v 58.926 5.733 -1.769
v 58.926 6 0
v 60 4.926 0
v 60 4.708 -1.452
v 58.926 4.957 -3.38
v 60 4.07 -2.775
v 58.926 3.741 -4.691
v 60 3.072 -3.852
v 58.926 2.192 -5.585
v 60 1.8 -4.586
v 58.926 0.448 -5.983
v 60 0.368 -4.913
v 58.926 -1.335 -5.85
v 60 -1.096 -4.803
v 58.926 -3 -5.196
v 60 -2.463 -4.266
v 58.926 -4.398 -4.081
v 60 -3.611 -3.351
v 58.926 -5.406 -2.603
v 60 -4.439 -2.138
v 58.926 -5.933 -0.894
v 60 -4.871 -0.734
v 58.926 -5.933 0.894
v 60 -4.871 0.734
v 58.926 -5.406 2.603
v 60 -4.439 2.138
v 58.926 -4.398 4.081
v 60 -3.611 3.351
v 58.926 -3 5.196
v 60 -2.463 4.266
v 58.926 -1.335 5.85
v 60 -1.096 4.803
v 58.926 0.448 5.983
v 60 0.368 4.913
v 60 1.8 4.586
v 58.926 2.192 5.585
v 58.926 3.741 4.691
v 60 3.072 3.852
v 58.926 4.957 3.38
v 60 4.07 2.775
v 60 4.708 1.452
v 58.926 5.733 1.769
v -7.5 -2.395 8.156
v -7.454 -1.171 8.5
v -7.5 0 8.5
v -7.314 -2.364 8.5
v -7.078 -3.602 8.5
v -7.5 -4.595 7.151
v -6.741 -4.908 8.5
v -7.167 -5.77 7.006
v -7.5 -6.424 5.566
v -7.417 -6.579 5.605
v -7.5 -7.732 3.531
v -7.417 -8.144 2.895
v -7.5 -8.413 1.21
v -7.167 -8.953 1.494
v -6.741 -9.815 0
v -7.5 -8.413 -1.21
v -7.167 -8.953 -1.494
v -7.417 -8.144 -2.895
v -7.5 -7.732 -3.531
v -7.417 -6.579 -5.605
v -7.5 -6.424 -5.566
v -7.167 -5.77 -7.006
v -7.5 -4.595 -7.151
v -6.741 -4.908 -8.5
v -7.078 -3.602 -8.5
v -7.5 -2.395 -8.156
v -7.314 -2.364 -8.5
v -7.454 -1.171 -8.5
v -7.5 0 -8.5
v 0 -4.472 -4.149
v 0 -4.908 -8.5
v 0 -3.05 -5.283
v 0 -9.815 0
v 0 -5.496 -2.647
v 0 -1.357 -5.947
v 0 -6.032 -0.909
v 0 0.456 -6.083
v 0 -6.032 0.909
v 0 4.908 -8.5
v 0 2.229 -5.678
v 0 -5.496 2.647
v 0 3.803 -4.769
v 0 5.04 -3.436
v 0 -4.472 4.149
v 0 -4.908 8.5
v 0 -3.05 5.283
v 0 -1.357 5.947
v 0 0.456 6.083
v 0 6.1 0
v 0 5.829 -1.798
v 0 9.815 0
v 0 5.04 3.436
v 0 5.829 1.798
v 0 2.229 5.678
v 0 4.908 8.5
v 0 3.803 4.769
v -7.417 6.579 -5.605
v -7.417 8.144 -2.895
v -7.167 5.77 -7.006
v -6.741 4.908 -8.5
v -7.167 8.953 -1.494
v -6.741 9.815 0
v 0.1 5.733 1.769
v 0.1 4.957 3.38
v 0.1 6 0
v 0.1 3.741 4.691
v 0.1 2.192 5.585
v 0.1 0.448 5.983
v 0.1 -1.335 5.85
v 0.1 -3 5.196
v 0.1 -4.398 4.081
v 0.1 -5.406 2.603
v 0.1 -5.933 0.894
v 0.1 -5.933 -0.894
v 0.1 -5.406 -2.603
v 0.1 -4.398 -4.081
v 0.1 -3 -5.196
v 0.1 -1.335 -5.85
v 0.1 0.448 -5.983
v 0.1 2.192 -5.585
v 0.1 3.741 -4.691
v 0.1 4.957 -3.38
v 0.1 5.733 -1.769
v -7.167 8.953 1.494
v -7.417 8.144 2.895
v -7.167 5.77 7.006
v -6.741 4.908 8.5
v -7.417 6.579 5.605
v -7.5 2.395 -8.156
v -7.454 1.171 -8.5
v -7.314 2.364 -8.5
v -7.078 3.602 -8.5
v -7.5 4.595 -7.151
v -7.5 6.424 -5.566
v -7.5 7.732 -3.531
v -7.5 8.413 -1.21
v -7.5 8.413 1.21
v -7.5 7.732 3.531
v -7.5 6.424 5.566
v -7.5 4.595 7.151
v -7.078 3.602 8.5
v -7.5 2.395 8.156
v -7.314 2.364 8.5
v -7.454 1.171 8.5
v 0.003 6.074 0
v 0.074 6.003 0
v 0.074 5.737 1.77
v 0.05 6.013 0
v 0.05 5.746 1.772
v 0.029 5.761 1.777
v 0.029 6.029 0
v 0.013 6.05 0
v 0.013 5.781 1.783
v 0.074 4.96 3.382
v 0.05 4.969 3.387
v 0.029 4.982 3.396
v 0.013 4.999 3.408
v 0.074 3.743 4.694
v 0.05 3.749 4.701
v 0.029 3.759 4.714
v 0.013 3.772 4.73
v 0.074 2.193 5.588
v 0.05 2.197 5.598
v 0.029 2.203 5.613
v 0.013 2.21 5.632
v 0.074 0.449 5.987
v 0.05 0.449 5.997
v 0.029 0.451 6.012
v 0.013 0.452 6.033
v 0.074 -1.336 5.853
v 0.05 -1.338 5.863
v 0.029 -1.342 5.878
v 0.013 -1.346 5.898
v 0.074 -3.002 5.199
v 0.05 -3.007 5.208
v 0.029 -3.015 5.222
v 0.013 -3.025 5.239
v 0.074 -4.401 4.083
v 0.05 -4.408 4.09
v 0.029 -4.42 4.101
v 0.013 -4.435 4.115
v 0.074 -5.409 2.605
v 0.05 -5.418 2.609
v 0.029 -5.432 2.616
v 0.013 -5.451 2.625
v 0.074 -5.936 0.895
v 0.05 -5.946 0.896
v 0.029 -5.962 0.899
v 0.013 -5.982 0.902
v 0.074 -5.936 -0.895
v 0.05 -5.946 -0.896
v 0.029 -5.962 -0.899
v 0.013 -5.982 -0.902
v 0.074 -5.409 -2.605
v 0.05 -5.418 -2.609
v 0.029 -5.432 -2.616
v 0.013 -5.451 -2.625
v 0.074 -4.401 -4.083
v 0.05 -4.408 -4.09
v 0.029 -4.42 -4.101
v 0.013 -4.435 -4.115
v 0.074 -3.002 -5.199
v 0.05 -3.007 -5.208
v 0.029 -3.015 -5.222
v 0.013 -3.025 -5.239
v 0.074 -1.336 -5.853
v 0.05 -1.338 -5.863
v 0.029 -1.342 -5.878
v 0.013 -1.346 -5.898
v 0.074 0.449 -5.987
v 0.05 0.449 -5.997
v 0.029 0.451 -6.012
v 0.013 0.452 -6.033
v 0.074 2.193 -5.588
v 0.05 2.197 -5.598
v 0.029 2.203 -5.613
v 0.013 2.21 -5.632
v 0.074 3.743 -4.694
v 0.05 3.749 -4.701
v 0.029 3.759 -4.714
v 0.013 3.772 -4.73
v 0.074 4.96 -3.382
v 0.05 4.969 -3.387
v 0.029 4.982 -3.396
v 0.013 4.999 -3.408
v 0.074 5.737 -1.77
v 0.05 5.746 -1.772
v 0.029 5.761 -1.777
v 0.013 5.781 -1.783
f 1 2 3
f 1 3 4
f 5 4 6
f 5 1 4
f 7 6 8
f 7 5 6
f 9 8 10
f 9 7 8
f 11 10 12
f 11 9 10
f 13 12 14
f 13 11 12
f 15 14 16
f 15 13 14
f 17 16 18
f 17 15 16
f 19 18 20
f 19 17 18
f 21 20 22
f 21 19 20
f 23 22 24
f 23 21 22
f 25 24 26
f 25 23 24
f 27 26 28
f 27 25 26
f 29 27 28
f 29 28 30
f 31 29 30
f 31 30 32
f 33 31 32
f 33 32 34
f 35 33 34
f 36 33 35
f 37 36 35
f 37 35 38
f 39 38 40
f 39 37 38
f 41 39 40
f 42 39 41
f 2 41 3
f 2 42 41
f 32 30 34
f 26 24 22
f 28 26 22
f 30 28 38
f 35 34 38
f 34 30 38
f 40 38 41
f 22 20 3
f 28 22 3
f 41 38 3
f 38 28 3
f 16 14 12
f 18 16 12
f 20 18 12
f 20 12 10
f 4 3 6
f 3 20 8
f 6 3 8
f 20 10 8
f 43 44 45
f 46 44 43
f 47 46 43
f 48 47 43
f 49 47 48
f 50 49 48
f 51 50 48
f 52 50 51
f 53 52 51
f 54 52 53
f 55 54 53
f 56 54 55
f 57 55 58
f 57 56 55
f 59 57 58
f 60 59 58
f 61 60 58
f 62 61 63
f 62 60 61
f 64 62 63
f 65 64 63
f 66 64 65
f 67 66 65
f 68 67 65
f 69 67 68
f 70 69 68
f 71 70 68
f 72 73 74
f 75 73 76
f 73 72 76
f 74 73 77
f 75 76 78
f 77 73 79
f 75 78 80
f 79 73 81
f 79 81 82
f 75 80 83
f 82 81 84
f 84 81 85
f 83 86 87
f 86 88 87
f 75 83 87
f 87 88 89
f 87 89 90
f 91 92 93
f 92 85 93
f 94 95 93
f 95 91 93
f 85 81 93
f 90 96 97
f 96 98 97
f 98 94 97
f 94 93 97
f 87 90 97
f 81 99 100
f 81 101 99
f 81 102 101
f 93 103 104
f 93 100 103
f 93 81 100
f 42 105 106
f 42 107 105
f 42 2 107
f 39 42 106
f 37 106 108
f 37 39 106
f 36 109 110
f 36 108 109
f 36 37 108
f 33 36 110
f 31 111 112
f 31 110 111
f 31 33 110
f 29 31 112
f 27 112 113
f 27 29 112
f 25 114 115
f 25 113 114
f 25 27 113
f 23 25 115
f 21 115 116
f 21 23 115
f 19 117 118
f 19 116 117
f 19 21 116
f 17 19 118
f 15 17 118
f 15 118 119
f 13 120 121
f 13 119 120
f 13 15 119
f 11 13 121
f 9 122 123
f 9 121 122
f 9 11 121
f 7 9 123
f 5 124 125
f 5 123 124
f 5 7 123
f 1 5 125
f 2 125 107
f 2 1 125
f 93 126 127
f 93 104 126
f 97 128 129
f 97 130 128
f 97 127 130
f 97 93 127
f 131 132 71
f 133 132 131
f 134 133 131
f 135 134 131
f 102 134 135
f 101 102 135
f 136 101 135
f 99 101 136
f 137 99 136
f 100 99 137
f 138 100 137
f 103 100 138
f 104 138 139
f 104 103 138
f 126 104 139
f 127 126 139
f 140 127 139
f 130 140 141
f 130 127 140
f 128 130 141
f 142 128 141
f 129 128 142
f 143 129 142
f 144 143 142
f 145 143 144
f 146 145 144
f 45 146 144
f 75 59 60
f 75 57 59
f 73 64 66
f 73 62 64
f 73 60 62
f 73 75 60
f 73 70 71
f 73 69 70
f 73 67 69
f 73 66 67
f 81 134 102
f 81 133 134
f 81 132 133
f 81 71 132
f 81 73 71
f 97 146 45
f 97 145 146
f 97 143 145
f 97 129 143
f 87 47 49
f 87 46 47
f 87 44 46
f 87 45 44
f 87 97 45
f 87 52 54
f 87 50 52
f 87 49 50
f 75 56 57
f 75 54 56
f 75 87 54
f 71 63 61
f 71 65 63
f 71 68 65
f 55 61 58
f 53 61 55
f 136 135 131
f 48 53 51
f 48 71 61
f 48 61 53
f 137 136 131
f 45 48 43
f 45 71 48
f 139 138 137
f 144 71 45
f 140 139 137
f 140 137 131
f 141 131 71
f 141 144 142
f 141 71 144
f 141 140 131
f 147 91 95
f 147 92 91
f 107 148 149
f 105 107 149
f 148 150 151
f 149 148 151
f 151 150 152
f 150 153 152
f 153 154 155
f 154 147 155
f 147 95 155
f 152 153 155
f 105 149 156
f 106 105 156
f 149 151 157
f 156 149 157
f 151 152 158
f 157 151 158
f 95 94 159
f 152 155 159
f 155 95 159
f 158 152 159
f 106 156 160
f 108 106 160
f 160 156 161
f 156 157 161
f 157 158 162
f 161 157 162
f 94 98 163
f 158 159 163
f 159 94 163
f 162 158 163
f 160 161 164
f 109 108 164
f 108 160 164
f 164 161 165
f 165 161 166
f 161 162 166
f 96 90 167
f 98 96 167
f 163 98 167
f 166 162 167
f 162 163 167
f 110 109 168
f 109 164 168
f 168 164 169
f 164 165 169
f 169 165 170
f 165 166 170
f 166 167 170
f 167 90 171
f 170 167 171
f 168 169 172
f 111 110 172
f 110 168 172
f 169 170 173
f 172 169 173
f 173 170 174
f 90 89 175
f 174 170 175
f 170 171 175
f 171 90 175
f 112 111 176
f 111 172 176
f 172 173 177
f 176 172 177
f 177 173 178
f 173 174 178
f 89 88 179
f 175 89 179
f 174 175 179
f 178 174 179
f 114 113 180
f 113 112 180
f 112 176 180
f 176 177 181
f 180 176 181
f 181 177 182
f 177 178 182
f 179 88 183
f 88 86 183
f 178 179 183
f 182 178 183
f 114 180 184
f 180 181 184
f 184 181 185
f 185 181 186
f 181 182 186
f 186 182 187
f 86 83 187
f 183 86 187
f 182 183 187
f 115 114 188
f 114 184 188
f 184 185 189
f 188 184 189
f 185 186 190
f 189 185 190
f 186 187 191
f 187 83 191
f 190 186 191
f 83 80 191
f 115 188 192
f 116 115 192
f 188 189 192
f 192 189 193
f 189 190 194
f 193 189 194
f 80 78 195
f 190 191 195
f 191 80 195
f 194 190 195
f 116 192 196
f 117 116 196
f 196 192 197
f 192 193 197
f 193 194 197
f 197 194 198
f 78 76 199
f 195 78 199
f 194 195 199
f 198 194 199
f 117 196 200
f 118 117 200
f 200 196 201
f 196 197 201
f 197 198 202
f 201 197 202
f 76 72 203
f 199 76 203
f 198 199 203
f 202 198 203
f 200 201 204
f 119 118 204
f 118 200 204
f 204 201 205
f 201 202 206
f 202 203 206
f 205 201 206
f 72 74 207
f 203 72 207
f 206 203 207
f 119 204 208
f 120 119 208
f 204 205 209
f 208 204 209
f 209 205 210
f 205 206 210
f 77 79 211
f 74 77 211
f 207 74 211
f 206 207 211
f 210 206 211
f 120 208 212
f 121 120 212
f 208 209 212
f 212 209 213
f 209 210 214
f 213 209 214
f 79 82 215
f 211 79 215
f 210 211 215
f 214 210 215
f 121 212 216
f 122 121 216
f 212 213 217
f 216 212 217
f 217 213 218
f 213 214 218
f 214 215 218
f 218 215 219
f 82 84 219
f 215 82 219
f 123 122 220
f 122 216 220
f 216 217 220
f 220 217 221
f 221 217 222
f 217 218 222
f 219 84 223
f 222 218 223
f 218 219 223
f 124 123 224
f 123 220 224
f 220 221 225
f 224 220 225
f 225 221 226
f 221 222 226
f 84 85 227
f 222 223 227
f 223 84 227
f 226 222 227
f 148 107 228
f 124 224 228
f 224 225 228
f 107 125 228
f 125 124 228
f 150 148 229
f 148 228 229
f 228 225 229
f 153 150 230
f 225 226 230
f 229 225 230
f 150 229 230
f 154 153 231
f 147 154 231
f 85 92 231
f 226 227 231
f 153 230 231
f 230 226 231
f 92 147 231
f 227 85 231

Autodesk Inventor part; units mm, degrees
ref_plane "YZ Plane" through (0, 0, 0) normal (1, 0, 0) x (0, 1, 0)
ref_plane "XZ Plane" through (0, 0, 0) normal (0, 1, 0) x (-1, 0, 0)
sketch "Skizze1" plane through (0, 0, 0) normal (0, 0, 1) x (1, 0, 0)
  line L0 (0, 6) -> (60, 6)
  line L1 (60, 6) -> (60, 0)
  line L2 (60, 0) -> (0, 0)
  line L3 (-12, 0) -> (72, 0) projected
  line L4 (0, -1.2) -> (0, 7.2) projected
  line L5 (0, 6) -> (0, 0)
  dimension "d2" = 12
  dimension "d59" = 60
revolve "Körper" add sketch "Skizze1" angle 360 about axis through (60, 0, 0) along (-1, 0, 0)
sketch "Skizze2" plane through (0, 0, 0) normal (-1, 0, 0) x (0, 0, 1)
  line L0 (0, 9.815) -> (8.5, 4.9075)
  line L1 (8.5, 4.9075) -> (8.5, -4.9075)
  line L2 (8.5, -4.9075) -> (0, -9.815)
  line L3 (0, -9.815) -> (-8.5, -4.9075)
  line L4 (-8.5, -4.9075) -> (-8.5, 4.9075)
  line L5 (-8.5, 4.9075) -> (0, 9.815)
  line L6 (-11.9, 0) -> (11.9, 0) projected
  line L7 (0, 13.7409) -> (0, -13.7409) projected
  point P0 (0, 0)
  point P1 (0, 0)
  dimension "d11" = 17
extrude "Kopf" add sketch "Skizze2" along normal blind 7.5
sketch "Skizze4" plane through (0, 0, 0) normal (0, 0, 1) x (1, 0, 0)
  line L0 (-6.5185, 10.2) -> (-7.5, 8.5)
  line L1 (-1.1, 0) -> (-0.234, 0)
  line L2 (-8.9532, 0) -> (1.2192, 0) projected
  line L3 (-7.5, 10.2) -> (-6.5185, 10.2)
  line L4 (-7.5, 8.5) -> (-7.5, 10.2)
  line L5 (0, 12.24) -> (0, -2.04) projected
  dimension "d65" = 17
  dimension "d67" = 30
  dimension "d68" = 20.4
  dimension "d69" = 7.5
revolve "Fase1" cut sketch "Skizze4" angle 360 about axis through (-1.1, 0, 0) along (1, 0, 0)
thread "Gewinde" size "M12x1.75" class "6g" standard "ISO Metric profile" length 30
chamfer "Fase2" distance 1.0735 distance2 1.0736 1 edges at (60, -6, 0) measured on face at (60, -2.1318, 1.2492)
fillet "Fillet2" radius 0.1 1 edges at (0, -6, 0)
ref_plane "Work Plane1" through (1.525, 0, 0) normal (0, 0, 1) x (1, 0, 0)
equation "\"d2\" = GD"
equation "\"d59\" = NLG"
equation "\"d11\" = SW"
equation "\"d3\" = KOH"
equation "\"d71\" = RR"
equation "\"d15\" = GEL"
equation "\"d6\" = -0.5 * SPD + 0.5 * GD"
equation "\"d65\" = SW"
equation "\"d67\" = ANG1"
equation "\"d68\" = 1.2 * SW"
equation "\"d69\" = KOH"
equation "\"NLG\" = 60"
equation "\"GD\" = NND"
equation "\"BDM\" = NND"
equation "\"KOH\" = 7.5"
equation "\"GEL\" = 30"
equation "\"SW\" = 17"
equation "\"SW0\" = SW"
equation "\"SPD\" = NND - 1.2269 * PTC"
equation "\"SD2\" = NND"
equation "\"SD\" = 0"
equation "\"ANG1\" = 30deg"
equation "\"GAL\" = 0.61345 * PTC"
equation "\"GUL\" = 0.61345 * PTC"
equation "\"RR\" = 0.1"
equation "\"RR1\" = 0.1"
equation "\"GD1\" = THREADDIA - 1.2269 * PTC"
equation "\"THREADDIA\" = 12"
equation "\"TOA\" = 30deg"
equation "\"PTC\" = 1.75"
equation "\"NND\" = 12"
equation "\"E0\" = 1.155 * SW"
properties part number "ISO 4016 - M12 x 60" material "Steel, Mild"
